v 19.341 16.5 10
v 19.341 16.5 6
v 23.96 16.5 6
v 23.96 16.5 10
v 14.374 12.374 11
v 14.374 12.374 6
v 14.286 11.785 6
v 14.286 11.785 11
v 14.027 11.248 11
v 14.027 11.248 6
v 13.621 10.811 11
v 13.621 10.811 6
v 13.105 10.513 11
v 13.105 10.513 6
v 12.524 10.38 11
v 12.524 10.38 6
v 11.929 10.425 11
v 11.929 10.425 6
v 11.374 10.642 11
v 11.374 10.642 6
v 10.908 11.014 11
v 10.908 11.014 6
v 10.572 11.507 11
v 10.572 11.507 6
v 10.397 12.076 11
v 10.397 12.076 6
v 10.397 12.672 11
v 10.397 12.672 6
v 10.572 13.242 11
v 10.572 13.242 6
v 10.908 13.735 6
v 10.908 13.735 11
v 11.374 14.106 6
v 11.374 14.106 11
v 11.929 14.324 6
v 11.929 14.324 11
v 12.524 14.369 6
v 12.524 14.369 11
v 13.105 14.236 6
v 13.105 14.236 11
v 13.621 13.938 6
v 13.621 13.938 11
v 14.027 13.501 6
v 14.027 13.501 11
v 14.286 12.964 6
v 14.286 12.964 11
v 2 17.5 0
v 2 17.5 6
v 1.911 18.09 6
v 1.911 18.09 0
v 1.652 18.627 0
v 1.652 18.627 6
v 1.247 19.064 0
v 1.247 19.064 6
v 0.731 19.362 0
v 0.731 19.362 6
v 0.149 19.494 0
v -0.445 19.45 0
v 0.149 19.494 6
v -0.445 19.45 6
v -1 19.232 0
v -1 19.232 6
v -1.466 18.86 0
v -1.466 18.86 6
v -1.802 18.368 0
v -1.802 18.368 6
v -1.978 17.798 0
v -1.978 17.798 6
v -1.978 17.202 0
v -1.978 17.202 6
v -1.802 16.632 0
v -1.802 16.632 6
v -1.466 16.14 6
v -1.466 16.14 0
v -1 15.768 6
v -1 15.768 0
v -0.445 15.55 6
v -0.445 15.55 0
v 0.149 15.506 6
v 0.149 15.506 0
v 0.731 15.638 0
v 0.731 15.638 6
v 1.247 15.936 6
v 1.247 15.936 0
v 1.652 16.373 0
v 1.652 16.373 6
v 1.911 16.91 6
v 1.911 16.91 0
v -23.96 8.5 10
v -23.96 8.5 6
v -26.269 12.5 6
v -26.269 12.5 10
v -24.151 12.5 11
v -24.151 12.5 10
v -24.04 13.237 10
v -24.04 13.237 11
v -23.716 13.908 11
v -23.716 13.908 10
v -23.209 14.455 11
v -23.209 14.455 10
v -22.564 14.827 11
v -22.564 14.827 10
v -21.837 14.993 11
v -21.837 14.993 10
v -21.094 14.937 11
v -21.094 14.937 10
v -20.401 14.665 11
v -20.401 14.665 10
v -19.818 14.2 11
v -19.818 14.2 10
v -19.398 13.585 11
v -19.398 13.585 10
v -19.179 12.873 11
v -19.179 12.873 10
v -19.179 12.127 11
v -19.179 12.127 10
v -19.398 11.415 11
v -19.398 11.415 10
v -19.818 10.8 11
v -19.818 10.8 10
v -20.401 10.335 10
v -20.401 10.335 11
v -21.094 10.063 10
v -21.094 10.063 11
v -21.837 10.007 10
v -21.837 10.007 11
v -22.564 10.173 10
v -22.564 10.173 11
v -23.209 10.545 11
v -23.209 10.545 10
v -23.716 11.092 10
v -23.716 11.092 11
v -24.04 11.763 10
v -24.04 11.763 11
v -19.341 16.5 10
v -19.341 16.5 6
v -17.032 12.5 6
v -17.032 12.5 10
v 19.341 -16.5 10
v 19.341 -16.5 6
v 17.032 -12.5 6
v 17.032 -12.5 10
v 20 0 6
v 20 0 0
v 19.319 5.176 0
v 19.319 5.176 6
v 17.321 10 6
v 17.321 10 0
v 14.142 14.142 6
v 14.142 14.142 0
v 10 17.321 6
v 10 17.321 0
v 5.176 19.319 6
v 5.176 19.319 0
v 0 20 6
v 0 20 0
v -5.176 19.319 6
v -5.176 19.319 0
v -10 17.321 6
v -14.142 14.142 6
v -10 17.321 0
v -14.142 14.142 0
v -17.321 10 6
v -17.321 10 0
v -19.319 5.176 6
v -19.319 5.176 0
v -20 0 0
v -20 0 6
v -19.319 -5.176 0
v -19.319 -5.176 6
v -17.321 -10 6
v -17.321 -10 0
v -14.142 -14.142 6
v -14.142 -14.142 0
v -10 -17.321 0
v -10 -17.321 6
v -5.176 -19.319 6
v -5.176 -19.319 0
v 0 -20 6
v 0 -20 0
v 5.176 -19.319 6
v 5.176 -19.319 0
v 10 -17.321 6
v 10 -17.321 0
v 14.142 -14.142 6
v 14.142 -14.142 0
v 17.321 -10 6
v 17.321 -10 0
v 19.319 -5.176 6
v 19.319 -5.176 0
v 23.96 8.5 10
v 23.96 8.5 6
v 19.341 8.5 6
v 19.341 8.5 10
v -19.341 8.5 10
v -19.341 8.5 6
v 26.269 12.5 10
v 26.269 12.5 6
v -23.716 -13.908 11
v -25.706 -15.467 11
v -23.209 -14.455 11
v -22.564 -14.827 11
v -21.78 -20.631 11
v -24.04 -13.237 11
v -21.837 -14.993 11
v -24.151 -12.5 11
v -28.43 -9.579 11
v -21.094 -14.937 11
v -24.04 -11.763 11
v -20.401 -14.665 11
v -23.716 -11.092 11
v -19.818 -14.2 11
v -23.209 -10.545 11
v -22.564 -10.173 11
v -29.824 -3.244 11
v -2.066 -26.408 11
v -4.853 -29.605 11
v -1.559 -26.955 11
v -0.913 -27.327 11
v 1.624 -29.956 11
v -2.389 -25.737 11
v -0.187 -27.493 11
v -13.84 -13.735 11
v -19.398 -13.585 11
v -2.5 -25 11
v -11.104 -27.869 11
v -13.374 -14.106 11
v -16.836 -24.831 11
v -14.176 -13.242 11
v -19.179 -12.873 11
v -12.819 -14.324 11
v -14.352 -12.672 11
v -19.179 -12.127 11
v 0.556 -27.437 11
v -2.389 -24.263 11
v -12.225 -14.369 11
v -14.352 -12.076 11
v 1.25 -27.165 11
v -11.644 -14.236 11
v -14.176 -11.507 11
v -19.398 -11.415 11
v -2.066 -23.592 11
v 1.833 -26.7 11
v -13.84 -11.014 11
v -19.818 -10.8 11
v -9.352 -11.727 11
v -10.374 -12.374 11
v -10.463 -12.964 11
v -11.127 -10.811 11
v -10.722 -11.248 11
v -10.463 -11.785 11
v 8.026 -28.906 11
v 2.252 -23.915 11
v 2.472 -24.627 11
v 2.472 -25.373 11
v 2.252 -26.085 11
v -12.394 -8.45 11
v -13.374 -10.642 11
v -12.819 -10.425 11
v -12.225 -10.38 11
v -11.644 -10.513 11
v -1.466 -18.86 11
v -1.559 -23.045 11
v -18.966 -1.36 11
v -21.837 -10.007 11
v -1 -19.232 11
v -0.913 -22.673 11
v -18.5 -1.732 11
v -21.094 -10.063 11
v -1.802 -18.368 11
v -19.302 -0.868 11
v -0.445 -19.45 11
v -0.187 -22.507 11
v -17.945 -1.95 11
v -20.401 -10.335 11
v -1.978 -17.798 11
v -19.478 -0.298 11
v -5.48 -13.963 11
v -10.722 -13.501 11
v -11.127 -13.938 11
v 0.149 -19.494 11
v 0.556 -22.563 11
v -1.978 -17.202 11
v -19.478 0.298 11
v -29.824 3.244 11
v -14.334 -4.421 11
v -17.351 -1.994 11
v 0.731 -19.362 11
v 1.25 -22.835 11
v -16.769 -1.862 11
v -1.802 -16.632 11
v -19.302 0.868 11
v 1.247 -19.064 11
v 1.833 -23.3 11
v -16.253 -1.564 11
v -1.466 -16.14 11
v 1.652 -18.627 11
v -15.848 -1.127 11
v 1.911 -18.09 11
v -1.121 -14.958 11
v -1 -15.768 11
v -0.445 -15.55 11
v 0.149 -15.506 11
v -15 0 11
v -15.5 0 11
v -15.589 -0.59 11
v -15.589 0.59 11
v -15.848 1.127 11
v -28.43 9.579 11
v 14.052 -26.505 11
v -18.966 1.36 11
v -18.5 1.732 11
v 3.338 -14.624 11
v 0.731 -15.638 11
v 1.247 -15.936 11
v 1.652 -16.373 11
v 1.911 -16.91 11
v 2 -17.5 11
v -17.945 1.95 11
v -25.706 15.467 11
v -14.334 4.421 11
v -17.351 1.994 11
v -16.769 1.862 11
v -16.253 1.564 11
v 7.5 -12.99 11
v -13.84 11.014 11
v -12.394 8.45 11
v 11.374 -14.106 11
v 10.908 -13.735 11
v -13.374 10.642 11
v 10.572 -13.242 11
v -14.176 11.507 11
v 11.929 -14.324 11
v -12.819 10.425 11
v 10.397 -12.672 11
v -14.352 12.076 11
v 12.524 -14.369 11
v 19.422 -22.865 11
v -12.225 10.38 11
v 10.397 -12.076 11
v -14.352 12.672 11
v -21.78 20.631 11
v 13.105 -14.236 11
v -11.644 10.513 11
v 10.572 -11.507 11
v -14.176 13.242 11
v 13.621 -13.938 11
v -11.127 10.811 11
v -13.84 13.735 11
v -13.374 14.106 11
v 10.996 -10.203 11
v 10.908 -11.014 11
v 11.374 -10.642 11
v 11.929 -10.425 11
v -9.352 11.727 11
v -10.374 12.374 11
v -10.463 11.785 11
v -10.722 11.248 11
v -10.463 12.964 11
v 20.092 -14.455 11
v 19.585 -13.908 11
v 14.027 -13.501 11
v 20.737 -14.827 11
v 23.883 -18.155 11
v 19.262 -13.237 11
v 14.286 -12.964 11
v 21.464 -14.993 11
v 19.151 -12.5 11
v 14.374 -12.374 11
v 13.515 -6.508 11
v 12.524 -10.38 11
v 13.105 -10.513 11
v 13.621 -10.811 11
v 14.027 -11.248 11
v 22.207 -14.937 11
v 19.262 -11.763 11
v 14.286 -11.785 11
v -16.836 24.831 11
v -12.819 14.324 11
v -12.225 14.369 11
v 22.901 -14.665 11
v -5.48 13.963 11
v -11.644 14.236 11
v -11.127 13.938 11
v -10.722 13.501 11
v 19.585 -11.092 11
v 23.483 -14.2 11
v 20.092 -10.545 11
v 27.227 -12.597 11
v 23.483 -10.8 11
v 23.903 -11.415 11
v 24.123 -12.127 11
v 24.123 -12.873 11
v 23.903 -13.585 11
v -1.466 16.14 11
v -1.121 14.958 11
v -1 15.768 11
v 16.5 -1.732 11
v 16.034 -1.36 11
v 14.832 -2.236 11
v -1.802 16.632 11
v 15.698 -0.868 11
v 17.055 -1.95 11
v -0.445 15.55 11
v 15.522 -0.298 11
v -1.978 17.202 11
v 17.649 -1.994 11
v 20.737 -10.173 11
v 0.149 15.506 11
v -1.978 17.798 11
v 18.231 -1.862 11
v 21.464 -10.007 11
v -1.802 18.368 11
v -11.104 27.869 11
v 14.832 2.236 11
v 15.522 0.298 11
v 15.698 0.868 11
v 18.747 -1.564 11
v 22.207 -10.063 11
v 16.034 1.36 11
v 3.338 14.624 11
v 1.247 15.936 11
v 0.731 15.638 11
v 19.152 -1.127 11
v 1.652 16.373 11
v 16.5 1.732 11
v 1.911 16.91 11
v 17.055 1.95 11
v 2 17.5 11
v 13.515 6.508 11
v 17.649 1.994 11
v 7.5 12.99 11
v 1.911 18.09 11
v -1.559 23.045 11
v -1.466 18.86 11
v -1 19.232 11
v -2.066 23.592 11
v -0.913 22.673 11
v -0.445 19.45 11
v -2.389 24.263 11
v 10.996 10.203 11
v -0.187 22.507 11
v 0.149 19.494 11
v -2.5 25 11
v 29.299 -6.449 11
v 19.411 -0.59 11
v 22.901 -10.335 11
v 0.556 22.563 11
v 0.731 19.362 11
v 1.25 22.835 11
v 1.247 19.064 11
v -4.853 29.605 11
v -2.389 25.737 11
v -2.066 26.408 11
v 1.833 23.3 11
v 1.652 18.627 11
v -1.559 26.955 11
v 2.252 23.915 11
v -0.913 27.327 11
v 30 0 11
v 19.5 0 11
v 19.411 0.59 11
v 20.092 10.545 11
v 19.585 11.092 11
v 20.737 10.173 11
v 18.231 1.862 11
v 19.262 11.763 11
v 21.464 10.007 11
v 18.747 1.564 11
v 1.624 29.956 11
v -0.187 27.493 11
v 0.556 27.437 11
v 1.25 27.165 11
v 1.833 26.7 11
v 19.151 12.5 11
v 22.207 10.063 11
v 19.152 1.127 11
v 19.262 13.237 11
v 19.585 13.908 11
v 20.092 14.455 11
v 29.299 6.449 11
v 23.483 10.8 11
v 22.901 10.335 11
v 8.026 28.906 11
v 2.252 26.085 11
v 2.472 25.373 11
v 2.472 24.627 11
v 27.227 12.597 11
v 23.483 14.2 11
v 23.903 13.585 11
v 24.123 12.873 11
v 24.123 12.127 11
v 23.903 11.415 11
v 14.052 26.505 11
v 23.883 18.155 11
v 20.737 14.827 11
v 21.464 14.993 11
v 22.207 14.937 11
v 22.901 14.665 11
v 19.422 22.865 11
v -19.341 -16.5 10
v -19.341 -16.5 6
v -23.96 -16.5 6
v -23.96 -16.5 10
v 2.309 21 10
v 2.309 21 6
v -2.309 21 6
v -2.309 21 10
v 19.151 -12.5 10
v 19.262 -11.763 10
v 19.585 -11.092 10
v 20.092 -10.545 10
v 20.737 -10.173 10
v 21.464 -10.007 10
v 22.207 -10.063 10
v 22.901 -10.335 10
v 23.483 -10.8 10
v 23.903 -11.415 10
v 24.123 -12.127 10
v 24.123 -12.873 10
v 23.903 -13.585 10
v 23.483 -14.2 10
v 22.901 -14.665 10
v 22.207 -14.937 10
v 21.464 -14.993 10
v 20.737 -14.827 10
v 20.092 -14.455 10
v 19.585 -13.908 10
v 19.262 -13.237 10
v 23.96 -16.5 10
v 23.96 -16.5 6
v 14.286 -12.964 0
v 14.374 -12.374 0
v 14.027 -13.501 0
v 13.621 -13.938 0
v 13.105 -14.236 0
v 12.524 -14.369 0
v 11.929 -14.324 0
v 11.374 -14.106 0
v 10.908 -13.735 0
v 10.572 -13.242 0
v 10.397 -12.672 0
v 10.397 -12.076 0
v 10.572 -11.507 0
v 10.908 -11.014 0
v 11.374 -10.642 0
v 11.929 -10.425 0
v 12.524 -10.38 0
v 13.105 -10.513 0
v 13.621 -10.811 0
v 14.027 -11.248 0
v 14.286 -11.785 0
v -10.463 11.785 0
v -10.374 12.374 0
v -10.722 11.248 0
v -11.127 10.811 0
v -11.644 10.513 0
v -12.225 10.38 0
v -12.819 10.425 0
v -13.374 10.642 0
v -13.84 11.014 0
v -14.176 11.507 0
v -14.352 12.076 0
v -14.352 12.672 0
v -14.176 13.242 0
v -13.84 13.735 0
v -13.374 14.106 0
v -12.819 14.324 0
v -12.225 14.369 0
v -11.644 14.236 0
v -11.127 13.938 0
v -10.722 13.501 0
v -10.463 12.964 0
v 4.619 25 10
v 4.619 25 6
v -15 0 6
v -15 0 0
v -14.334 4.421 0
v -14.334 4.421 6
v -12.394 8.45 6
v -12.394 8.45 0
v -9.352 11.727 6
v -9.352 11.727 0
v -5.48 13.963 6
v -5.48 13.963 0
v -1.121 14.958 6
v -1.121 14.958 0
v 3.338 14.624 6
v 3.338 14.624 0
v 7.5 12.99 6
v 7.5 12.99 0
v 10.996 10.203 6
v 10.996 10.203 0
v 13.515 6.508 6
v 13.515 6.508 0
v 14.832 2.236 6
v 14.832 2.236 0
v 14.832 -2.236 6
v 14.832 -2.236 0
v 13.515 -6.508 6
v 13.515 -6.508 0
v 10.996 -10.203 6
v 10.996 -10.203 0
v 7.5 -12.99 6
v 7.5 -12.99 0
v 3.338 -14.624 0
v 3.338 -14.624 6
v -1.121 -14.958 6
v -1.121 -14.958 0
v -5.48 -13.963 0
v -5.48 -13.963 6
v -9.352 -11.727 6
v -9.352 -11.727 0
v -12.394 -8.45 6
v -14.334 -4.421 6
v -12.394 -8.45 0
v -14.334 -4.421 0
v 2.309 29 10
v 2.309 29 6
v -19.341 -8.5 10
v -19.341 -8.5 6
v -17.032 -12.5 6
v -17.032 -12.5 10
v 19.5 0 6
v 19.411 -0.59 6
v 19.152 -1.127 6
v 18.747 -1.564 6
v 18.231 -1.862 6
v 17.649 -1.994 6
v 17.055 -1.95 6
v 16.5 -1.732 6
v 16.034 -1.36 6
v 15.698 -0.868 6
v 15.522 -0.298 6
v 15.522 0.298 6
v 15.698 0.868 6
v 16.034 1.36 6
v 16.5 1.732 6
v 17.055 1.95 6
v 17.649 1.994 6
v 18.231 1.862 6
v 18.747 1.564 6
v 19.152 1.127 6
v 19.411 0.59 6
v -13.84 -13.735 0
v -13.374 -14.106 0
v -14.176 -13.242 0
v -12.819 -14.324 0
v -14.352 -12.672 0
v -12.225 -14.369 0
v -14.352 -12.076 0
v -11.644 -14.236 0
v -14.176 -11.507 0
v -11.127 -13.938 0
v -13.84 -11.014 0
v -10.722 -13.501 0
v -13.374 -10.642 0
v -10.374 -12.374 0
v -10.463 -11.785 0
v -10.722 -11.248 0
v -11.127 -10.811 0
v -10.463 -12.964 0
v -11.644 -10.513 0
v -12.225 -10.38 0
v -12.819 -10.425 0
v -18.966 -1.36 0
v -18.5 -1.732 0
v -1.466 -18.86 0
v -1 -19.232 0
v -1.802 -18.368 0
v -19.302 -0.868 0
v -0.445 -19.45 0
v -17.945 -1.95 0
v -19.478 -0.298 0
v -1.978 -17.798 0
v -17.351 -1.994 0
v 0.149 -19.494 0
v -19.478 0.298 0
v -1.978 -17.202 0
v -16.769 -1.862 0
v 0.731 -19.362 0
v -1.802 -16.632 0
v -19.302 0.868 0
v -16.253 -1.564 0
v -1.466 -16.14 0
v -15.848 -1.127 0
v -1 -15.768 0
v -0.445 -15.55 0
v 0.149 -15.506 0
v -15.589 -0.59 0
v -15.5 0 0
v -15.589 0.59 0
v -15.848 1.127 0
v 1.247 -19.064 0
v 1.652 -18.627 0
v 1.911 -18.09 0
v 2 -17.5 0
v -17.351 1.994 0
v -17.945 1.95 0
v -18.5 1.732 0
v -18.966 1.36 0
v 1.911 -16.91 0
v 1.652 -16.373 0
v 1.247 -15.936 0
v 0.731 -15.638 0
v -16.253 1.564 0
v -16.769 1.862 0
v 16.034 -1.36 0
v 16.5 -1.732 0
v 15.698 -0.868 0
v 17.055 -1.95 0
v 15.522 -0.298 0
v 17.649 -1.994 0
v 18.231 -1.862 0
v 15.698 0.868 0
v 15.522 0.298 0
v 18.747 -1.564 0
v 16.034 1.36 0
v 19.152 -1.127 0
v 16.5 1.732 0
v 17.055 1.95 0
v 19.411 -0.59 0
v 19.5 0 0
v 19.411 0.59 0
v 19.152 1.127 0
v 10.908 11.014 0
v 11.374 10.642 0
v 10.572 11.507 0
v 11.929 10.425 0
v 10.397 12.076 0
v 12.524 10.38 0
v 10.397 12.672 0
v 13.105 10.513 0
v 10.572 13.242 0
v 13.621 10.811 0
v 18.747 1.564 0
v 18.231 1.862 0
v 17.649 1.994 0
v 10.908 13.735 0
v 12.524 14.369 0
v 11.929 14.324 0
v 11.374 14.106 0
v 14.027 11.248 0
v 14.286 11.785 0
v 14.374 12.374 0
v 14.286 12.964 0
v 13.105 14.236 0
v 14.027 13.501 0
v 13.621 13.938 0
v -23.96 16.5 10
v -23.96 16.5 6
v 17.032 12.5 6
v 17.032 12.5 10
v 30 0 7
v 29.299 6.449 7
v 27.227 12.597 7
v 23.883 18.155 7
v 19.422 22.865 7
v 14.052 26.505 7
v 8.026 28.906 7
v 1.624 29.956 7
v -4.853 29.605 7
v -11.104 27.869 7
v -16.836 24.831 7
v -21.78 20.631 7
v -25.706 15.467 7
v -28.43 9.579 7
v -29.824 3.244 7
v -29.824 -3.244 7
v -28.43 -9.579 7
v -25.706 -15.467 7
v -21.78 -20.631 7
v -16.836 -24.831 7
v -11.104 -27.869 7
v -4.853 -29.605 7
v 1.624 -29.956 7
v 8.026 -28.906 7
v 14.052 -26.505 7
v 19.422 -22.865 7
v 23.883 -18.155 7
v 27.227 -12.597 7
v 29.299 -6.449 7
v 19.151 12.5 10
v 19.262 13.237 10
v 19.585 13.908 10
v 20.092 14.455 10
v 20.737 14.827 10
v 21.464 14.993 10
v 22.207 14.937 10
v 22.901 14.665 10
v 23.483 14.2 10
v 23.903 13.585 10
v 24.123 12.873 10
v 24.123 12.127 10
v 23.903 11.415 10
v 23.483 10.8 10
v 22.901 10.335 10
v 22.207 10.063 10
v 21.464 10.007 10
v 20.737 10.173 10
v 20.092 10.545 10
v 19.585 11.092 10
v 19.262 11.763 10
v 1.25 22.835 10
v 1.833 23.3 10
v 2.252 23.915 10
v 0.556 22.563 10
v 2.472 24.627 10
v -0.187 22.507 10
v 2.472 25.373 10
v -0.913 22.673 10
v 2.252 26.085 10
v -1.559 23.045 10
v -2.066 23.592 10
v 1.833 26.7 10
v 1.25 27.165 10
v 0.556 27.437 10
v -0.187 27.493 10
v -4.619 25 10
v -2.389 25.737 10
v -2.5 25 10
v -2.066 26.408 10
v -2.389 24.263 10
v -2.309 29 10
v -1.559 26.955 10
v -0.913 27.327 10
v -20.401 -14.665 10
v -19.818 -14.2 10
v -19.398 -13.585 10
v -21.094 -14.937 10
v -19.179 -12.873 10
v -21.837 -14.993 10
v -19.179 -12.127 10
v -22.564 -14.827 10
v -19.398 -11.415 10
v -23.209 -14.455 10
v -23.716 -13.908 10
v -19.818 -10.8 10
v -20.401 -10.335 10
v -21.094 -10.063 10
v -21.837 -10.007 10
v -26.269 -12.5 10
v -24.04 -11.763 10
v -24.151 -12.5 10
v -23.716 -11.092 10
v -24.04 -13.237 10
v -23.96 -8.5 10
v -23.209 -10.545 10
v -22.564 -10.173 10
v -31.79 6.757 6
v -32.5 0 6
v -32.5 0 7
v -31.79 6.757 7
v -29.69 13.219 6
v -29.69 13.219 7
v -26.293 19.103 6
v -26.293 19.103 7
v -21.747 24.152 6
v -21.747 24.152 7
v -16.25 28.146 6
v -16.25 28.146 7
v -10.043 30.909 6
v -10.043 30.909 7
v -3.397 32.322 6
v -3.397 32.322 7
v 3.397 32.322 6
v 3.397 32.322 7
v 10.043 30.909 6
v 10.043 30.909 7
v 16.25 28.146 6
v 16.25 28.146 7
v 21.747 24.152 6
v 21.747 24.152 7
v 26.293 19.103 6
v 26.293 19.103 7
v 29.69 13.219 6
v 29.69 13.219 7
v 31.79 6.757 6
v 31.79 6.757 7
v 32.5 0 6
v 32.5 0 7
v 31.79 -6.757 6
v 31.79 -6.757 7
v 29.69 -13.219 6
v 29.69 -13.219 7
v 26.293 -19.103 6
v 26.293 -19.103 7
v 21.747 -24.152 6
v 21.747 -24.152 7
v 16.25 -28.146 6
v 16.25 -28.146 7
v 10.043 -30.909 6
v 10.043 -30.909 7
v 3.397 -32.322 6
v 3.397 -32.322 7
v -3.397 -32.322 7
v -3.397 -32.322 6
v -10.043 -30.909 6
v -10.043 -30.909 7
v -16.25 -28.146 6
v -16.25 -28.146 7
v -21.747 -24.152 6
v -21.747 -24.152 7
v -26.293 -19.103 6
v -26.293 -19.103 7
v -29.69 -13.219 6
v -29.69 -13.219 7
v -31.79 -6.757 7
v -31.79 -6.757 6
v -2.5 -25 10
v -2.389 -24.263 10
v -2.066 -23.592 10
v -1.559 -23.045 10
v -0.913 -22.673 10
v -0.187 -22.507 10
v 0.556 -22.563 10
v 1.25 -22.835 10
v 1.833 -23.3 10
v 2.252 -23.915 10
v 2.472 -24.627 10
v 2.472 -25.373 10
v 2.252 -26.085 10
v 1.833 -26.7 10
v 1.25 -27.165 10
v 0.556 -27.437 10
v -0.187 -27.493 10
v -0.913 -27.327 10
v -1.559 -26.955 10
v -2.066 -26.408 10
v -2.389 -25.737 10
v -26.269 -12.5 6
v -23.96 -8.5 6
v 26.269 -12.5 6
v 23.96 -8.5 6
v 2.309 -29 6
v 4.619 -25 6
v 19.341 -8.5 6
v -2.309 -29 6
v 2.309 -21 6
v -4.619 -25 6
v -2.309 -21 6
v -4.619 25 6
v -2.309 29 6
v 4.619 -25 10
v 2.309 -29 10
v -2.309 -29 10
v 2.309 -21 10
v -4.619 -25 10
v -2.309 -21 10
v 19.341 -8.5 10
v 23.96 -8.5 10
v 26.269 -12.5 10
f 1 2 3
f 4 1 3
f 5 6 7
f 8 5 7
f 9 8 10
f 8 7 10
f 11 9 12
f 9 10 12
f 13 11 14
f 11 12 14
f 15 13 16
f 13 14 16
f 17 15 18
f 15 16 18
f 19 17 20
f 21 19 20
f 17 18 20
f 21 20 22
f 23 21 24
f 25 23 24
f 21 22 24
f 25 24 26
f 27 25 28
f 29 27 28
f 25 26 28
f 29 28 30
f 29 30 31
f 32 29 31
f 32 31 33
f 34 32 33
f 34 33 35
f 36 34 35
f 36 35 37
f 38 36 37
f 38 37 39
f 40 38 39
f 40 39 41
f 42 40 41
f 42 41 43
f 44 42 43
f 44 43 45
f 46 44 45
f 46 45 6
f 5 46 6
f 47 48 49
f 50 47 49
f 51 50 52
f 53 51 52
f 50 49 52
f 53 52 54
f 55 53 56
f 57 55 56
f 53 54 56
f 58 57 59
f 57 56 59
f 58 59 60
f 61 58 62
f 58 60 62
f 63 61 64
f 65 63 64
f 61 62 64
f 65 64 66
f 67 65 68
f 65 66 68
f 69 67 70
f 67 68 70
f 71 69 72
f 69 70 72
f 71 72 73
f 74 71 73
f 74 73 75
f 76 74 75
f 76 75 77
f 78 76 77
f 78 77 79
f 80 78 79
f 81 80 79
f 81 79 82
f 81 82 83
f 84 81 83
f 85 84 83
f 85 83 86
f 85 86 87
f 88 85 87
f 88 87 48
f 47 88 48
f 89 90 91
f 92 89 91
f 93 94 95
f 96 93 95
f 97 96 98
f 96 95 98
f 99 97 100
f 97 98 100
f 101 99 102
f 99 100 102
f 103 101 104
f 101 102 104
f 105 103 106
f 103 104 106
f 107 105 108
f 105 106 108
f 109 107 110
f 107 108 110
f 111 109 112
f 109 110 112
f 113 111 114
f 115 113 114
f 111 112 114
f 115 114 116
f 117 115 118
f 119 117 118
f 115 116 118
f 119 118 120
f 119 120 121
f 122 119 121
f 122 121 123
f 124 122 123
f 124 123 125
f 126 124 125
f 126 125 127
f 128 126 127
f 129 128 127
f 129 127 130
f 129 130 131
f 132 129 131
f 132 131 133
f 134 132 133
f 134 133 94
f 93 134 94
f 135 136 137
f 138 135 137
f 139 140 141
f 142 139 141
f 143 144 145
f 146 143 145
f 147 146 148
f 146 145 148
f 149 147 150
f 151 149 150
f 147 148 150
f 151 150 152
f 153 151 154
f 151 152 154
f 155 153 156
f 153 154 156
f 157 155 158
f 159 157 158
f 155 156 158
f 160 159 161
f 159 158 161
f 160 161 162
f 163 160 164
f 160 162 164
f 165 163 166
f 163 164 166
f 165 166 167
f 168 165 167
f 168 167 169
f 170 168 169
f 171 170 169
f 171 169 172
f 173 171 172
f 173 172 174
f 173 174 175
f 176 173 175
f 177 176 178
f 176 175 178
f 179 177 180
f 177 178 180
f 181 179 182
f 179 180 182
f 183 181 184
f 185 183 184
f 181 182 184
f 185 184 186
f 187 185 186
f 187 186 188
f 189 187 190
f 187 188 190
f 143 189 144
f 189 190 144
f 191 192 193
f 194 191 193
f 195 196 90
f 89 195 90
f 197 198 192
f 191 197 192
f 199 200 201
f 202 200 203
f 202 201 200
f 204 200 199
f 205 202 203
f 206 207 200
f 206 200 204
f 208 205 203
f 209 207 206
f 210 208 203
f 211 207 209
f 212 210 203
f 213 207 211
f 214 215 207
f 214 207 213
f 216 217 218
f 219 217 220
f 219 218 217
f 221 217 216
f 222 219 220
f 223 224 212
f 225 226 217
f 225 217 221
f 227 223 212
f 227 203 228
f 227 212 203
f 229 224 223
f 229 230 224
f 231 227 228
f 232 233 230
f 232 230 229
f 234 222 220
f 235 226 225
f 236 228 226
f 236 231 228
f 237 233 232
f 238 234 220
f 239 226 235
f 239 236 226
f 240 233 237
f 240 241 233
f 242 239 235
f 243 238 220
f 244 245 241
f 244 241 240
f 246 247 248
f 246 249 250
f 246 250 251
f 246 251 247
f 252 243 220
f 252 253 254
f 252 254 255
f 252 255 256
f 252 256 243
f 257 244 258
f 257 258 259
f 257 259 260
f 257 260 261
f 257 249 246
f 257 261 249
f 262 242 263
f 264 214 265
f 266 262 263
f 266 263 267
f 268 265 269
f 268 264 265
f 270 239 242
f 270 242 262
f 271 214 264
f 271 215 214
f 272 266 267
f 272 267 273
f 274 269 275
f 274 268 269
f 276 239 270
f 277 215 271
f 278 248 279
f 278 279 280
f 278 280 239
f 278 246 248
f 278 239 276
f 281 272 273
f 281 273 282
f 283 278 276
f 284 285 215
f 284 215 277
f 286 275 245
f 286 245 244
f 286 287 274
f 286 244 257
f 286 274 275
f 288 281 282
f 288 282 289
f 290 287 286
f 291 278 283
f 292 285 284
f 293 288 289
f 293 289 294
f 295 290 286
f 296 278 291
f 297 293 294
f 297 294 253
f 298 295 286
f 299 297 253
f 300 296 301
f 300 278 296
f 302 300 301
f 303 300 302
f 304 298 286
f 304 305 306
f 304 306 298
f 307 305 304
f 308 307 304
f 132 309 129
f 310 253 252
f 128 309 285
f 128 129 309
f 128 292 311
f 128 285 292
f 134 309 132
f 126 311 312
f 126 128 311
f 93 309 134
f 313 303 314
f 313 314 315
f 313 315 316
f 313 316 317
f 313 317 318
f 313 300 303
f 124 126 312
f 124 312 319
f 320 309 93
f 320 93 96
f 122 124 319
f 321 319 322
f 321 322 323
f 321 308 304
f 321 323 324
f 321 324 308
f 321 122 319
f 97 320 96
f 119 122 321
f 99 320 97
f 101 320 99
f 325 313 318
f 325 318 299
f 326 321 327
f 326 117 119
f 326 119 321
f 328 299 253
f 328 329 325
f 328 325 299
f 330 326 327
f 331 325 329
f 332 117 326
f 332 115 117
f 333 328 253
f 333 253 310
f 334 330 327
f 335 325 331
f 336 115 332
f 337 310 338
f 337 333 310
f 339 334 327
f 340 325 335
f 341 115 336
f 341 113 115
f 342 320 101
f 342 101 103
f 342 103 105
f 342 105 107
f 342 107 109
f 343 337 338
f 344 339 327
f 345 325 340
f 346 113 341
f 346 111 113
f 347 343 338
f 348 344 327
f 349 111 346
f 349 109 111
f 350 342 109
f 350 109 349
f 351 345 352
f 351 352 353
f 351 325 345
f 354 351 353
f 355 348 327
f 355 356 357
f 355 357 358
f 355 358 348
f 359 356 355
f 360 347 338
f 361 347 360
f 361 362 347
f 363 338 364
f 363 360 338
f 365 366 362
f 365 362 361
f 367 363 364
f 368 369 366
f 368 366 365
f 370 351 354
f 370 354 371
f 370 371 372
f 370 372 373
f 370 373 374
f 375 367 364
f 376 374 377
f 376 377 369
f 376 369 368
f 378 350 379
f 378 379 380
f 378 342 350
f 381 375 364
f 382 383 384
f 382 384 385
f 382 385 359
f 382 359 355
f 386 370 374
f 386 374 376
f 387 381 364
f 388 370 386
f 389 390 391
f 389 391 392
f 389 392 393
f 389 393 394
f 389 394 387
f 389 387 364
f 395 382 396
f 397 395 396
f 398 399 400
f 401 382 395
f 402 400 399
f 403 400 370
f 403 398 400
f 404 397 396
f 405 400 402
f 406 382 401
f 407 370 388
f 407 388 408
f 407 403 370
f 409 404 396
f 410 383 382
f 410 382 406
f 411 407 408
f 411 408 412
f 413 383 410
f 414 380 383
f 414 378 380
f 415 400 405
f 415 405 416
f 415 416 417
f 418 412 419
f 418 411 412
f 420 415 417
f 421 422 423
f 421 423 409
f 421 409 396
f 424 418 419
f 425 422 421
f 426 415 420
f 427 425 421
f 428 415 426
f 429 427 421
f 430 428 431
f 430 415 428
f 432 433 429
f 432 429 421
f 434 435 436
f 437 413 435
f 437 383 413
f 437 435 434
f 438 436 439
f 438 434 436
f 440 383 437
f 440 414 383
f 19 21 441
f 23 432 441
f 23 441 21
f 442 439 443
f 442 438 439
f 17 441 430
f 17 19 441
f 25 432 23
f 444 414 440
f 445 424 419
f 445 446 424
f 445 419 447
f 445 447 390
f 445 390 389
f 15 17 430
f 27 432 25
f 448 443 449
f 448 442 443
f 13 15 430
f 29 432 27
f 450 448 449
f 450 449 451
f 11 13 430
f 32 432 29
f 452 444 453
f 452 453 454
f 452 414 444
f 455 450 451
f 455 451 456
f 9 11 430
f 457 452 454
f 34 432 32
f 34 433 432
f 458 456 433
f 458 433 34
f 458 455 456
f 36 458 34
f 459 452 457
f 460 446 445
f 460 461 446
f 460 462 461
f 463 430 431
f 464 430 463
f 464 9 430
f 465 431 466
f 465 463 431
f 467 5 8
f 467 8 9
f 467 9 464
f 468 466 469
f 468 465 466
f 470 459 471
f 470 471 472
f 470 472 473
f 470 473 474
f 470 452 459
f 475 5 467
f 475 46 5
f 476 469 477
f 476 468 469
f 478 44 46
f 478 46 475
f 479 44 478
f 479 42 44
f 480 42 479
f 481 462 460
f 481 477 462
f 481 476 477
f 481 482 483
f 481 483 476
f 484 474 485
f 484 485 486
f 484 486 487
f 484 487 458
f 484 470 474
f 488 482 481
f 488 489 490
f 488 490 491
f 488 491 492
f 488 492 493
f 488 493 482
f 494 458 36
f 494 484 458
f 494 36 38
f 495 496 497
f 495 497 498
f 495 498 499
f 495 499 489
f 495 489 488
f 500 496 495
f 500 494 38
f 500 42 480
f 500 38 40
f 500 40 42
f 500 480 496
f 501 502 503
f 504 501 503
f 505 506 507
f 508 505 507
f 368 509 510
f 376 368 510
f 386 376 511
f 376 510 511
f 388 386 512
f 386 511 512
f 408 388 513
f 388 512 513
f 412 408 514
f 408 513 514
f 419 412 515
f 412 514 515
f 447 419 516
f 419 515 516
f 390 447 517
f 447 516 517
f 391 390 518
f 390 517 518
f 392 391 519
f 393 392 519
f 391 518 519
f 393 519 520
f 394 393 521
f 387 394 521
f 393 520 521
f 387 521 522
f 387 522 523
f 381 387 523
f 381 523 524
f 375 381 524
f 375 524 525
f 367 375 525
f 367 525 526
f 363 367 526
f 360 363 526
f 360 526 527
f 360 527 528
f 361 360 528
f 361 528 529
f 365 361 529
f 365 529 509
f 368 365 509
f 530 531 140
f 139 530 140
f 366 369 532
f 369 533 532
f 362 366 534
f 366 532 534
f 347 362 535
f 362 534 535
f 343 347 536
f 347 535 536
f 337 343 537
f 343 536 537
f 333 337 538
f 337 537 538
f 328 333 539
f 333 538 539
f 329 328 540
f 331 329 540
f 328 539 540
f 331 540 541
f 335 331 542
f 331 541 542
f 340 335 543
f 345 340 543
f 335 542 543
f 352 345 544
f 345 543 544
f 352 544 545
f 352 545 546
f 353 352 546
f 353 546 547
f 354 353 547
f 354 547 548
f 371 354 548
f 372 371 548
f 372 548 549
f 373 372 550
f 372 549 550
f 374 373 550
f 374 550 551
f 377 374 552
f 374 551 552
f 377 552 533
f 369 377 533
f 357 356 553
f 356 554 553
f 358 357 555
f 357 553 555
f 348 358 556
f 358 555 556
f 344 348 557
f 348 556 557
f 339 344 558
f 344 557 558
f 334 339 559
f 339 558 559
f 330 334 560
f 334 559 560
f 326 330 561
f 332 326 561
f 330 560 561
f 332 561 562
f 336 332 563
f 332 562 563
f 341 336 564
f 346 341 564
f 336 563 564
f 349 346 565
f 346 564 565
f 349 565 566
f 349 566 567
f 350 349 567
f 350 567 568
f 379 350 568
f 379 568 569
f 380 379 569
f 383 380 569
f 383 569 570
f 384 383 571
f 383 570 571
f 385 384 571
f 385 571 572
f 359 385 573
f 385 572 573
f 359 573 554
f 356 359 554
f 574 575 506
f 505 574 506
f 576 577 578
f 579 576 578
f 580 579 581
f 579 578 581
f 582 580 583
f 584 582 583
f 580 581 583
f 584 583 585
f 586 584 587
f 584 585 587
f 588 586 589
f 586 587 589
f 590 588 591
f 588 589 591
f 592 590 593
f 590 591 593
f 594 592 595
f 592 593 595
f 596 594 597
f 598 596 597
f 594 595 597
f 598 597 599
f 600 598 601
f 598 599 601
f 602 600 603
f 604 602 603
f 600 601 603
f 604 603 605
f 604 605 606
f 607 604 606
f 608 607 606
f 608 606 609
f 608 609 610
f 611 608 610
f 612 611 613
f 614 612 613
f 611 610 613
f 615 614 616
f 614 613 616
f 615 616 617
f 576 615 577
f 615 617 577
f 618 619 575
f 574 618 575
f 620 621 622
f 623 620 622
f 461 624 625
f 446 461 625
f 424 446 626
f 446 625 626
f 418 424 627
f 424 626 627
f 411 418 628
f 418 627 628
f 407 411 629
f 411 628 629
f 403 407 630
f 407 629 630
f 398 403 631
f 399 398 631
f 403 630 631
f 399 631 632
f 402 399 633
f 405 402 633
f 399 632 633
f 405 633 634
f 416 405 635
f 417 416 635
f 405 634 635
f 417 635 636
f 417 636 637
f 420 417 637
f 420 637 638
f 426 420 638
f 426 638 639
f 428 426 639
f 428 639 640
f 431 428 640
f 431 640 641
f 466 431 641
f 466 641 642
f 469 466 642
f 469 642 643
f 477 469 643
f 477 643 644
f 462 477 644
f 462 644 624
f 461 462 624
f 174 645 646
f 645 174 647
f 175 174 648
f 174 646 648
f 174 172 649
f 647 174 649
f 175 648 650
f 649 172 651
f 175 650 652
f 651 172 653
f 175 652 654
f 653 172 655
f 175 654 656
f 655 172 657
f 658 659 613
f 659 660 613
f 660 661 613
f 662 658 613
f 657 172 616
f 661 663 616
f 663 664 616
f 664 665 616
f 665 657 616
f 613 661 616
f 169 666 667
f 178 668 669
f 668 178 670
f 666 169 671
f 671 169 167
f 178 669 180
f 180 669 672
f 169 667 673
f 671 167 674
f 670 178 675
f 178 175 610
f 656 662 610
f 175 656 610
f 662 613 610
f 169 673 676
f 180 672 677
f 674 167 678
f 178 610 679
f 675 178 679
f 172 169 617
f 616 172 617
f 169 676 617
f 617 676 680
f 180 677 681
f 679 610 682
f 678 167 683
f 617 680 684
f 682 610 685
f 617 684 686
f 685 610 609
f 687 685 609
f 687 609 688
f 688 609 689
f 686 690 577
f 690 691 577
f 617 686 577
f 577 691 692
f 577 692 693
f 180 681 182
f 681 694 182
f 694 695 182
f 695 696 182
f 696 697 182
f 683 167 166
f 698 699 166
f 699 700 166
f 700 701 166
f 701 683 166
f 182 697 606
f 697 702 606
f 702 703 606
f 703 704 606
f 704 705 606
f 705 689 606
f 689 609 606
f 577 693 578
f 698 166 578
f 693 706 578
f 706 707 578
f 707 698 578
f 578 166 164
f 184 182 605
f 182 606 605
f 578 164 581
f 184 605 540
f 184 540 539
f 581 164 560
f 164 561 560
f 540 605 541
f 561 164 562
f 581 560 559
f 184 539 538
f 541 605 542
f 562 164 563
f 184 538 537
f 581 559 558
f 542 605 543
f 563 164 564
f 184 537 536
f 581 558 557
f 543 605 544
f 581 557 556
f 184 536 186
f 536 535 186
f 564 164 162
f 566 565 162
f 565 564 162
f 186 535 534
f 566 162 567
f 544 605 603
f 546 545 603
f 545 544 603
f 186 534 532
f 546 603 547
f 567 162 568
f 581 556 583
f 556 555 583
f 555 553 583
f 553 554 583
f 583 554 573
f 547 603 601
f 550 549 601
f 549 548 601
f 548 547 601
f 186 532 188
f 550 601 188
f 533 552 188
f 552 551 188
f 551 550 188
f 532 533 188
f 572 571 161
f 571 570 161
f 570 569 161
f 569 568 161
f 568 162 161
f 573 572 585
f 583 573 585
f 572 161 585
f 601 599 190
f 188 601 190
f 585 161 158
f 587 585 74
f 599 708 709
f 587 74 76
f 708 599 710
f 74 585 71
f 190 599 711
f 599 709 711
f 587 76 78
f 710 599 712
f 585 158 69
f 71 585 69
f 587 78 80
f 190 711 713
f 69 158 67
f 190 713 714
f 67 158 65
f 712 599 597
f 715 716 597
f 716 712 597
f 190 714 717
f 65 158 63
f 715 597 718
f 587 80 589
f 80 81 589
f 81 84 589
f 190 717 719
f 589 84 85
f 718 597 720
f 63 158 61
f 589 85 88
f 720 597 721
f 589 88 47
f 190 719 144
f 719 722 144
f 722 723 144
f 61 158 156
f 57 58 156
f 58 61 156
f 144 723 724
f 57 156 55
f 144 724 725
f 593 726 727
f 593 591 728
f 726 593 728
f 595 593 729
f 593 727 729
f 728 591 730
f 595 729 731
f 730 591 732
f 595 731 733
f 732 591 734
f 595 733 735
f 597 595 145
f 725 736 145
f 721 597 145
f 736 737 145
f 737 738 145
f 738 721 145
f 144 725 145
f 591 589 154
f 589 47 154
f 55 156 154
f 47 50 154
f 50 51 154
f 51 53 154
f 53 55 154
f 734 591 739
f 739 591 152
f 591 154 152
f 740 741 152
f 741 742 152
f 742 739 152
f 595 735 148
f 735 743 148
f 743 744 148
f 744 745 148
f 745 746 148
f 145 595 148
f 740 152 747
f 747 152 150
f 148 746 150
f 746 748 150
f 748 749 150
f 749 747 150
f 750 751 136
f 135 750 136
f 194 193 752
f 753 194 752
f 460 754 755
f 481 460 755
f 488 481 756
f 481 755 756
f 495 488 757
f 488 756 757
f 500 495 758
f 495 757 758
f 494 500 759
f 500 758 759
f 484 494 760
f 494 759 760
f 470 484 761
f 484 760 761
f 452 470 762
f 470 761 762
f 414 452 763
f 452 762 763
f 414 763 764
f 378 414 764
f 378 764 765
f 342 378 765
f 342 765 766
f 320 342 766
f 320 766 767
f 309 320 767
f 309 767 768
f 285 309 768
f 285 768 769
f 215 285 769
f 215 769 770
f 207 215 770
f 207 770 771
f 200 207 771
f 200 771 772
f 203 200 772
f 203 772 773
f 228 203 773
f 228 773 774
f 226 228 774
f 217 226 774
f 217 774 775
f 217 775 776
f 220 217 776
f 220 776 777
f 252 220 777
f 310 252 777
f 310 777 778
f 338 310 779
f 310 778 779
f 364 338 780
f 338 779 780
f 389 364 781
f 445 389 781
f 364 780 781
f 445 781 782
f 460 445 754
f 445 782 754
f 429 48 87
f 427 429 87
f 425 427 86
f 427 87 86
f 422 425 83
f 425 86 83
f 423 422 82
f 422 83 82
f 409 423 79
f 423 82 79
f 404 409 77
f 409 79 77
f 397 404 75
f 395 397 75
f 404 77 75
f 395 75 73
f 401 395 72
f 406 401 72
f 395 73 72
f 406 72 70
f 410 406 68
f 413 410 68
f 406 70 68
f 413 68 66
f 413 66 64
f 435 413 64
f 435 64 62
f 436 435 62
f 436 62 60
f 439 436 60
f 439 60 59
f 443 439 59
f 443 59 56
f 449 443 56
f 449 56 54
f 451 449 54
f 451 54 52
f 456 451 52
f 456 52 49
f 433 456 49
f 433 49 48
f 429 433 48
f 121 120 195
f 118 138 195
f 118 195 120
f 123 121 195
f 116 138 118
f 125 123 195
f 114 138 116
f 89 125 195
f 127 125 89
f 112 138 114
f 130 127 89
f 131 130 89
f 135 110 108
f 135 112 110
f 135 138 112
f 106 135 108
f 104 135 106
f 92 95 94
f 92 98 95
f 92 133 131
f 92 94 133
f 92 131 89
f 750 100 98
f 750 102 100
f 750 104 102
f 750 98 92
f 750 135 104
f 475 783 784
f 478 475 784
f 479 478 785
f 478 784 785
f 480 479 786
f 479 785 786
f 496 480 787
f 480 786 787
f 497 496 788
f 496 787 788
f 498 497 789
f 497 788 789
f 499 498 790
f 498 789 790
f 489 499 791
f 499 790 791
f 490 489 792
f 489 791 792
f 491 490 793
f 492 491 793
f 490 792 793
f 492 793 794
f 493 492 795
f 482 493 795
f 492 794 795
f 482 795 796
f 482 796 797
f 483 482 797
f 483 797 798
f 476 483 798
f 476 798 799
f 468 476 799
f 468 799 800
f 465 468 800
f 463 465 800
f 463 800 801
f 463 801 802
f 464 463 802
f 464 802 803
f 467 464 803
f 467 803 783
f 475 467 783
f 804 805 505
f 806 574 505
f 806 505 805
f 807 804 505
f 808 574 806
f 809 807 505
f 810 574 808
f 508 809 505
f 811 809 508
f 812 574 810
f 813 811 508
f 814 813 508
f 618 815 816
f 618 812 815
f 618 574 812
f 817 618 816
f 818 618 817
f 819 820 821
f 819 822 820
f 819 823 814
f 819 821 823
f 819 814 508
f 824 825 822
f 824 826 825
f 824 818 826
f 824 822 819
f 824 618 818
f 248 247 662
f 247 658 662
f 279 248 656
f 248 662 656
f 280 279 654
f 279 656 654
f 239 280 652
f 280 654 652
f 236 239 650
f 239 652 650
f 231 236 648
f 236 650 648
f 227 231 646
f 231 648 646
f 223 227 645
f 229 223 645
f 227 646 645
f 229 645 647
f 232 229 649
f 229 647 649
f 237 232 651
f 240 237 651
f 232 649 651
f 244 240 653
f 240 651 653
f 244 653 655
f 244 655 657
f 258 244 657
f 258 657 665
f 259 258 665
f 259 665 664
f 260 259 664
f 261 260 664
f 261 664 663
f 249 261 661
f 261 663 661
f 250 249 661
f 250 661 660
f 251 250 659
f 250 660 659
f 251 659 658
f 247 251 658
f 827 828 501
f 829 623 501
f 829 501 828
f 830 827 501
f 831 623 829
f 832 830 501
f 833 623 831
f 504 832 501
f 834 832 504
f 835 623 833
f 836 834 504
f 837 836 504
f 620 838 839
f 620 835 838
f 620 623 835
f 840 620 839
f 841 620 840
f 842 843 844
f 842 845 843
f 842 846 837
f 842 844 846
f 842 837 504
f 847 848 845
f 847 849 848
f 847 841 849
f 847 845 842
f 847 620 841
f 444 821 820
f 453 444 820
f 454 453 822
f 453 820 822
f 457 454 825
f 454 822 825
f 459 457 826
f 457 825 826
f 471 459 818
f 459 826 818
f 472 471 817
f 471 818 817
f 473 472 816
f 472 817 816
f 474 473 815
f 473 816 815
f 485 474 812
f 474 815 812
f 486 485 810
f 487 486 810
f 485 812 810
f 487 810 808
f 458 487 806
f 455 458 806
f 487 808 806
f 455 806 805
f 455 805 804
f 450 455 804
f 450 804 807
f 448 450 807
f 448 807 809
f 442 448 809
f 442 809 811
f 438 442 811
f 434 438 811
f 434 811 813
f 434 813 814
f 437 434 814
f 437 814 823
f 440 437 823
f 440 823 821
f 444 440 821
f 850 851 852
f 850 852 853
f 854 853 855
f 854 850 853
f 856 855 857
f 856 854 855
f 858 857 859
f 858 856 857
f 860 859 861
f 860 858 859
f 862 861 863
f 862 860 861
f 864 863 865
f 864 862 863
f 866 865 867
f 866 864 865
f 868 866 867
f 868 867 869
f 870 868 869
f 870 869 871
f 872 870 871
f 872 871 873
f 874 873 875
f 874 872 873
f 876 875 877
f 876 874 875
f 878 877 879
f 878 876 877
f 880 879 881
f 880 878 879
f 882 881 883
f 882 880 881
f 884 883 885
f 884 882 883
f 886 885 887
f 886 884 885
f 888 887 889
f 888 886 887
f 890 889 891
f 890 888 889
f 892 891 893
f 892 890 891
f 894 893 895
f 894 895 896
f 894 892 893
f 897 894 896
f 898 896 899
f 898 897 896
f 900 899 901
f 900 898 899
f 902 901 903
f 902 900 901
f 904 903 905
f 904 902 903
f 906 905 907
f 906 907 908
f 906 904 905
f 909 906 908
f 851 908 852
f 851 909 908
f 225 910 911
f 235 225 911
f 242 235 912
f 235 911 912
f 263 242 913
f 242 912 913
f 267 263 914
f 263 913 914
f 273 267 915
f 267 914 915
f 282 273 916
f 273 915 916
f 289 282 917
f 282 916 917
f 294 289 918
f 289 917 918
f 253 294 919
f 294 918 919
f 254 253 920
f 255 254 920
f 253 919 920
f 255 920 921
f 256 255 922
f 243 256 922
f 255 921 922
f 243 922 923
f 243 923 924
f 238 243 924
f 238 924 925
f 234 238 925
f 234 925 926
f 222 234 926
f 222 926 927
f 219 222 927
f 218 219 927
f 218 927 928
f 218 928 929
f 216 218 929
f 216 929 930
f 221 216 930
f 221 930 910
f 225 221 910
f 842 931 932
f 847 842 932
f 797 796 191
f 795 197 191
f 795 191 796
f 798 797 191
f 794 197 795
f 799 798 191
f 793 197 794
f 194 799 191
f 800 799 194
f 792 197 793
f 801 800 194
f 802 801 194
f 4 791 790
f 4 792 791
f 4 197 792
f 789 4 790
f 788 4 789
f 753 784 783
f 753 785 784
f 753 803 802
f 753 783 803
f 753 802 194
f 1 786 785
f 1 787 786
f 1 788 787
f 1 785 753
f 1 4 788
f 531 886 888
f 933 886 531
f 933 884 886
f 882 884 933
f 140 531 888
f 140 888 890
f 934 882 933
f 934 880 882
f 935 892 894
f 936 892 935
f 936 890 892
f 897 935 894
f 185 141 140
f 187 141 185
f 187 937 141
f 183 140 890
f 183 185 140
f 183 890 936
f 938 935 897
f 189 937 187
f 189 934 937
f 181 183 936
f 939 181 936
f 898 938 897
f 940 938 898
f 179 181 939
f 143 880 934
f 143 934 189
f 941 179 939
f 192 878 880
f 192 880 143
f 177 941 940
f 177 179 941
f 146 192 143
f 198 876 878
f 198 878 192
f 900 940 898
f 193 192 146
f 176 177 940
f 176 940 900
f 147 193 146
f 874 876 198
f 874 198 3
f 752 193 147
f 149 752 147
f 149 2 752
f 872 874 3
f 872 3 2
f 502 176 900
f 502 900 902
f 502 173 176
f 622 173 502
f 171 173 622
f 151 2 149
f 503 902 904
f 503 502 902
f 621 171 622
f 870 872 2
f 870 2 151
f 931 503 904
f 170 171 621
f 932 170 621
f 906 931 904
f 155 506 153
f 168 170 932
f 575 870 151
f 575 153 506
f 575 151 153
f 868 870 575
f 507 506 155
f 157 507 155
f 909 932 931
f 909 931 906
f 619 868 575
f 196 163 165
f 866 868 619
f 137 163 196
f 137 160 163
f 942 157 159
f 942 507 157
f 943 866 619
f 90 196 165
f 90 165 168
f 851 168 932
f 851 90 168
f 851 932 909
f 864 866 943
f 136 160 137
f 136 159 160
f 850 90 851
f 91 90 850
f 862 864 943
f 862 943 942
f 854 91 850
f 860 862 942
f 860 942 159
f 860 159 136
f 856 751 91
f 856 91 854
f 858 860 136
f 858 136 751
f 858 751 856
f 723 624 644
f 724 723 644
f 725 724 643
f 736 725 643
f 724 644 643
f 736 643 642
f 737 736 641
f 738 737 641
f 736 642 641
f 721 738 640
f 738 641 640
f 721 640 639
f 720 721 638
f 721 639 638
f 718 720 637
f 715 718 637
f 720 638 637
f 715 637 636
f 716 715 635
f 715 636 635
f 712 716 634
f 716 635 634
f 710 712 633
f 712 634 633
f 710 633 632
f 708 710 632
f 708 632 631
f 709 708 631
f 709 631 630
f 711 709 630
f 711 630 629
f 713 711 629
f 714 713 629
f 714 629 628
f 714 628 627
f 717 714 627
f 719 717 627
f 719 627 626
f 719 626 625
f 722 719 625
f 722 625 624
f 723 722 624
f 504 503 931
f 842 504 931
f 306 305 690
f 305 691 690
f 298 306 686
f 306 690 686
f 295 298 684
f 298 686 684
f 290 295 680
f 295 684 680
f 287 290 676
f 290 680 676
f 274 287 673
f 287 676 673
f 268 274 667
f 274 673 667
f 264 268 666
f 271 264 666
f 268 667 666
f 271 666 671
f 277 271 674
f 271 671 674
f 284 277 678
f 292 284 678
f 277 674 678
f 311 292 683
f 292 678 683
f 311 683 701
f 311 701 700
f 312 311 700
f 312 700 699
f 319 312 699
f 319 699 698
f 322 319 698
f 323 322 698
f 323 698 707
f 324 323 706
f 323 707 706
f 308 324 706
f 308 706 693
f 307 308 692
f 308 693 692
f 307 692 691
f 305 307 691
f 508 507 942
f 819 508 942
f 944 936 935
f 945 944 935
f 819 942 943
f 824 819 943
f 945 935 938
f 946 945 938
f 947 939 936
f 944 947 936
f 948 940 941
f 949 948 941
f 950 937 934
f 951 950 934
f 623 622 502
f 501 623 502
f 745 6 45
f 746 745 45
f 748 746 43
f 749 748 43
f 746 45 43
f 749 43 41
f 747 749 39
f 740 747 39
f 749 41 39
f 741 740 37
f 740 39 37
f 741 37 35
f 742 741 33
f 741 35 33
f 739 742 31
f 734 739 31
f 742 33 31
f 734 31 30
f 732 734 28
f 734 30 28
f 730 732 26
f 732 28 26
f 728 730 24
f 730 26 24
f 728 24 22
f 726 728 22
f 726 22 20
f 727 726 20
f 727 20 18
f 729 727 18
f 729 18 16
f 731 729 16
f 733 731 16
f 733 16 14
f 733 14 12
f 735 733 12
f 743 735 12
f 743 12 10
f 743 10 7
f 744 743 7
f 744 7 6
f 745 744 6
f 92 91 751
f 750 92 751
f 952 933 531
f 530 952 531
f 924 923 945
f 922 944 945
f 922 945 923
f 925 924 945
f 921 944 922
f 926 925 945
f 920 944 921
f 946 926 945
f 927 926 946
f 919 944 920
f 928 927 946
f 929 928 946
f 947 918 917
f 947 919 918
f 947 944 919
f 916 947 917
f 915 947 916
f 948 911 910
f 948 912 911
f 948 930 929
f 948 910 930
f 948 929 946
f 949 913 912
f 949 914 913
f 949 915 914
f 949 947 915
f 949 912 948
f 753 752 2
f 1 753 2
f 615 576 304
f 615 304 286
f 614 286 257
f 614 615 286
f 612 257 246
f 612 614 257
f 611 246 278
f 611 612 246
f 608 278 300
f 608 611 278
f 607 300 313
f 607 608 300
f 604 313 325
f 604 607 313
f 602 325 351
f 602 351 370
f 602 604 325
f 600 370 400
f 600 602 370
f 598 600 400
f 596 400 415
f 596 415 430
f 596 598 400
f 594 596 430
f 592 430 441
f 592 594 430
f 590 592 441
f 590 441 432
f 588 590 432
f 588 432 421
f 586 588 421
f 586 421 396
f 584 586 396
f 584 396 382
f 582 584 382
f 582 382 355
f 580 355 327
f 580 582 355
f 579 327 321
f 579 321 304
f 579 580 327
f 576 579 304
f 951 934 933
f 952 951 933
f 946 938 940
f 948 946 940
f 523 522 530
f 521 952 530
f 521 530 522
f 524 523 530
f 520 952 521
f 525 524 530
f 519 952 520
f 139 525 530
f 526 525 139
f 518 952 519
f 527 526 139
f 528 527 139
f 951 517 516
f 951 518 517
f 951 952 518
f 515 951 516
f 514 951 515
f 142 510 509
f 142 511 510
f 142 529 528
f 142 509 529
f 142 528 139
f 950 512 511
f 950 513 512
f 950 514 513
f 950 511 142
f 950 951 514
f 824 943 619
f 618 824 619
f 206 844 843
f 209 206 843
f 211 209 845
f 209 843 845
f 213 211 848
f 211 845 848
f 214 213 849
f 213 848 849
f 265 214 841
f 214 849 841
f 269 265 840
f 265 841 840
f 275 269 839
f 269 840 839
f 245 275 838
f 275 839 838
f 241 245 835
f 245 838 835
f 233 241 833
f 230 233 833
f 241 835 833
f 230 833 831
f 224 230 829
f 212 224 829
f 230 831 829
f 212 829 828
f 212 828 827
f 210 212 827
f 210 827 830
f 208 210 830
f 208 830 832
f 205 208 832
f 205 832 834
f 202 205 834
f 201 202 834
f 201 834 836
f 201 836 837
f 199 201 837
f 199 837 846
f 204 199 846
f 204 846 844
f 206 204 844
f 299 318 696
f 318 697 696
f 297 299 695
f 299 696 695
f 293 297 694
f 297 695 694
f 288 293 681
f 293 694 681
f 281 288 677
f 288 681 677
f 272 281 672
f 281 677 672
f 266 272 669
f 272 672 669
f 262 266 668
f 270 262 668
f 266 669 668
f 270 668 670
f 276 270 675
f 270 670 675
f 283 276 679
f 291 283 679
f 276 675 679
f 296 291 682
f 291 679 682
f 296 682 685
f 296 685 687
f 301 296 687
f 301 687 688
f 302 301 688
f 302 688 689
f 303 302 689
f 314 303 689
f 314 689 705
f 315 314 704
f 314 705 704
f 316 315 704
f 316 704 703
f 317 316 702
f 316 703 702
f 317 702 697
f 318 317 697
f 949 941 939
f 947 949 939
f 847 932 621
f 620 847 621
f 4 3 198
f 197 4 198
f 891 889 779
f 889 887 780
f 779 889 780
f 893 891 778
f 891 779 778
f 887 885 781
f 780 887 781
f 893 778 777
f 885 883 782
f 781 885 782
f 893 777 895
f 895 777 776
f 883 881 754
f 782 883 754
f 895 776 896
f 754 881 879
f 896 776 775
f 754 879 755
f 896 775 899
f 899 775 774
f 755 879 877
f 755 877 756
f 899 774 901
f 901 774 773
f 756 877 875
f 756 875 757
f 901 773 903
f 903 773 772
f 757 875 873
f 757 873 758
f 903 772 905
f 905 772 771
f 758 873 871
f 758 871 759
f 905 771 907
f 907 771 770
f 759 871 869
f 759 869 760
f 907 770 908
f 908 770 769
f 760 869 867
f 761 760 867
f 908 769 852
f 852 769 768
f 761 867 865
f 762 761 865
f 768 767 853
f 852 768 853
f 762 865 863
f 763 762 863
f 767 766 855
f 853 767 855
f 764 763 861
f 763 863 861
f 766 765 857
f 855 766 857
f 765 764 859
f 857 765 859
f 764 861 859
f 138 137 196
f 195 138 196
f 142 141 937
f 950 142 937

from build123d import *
from build123d.topology import SkipClean

# Parameters (mm, degrees)
SKETCH1_R               = 20
BOSS_EXTRUDE1_DEPTH     = 6
CUT_EXTRUDE1_DEPTH      = 7
CUT_EXTRUDE1_DEPTH_BACK = 29.91366459
SKETCH2_R               = 2
SKETCH3_R               = 15
CUT_EXTRUDE2_DEPTH      = 6
SKETCH4_R               = 30
SKETCH4_R_2             = 15
BOSS_EXTRUDE2_DEPTH     = 5
CUT_EXTRUDE3_START      = -7
SKETCH6_R               = 2
CUT_EXTRUDE3_DEPTH      = 7
CUT_EXTRUDE4_DEPTH      = 4
SKETCH8_R               = 2.5
CUT_EXTRUDE5_DEPTH      = 4
SKETCH9_R               = 32.5
SKETCH9_R_2             = 30
BOSS_EXTRUDE3_DEPTH     = 1


with BuildPart() as part:
    # Sketch1 → Boss-Extrude1 (new body)
    with BuildSketch(Plane.XY):
        Circle(SKETCH1_R)
    extrude(amount=BOSS_EXTRUDE1_DEPTH)

    # Sketch2 → Cut-Extrude1 (cut, two sides: drawn at the far end of the back side and taken through both)
    with BuildSketch(Plane.XY.offset(6).offset(-CUT_EXTRUDE1_DEPTH_BACK)):
        with Locations((0, 17.5)):
            Circle(SKETCH2_R)
        with Locations((12.374368671, 12.374368671)):
            Circle(SKETCH2_R)
        with Locations((17.5, 0)):
            Circle(SKETCH2_R)
        with Locations((12.374368671, -12.374368671)):
            Circle(SKETCH2_R)
        with Locations((0, -17.5)):
            Circle(SKETCH2_R)
        with Locations((-12.374368671, -12.374368671)):
            Circle(SKETCH2_R)
        with Locations((-17.5, 0)):
            Circle(SKETCH2_R)
        with Locations((-12.374368671, 12.374368671)):
            Circle(SKETCH2_R)
    extrude(amount=CUT_EXTRUDE1_DEPTH + CUT_EXTRUDE1_DEPTH_BACK, mode=Mode.SUBTRACT)

    # Sketch3 → Cut-Extrude2 (cut)
    with BuildSketch(Plane(origin=(0, 0, 0), x_dir=(-1, 0, 0), z_dir=(0, 0, -1))):
        Circle(SKETCH3_R)
    extrude(amount=-CUT_EXTRUDE2_DEPTH, mode=Mode.SUBTRACT)

    # Sketch4 → Boss-Extrude2 (add)
    with SkipClean():  # the faces are left unmerged after this step: merging them gives an invalid solid
        with BuildSketch(Plane.XY.offset(6)):
            Circle(SKETCH4_R)
            Circle(SKETCH4_R_2, mode=Mode.SUBTRACT)
        extrude(amount=BOSS_EXTRUDE2_DEPTH)
    add(part.part.scale(1), mode=Mode.REPLACE)  # the faces are merged on a copy

    # Sketch6 → Cut-Extrude3 (cut)
    with SkipClean():  # the faces are left unmerged after this step: merging them gives an invalid solid
        with BuildSketch(Plane(origin=(0, 0, 6), x_dir=(-1, 0, 0), z_dir=(0, 0, -1)).offset(CUT_EXTRUDE3_START)):
            with Locations((0, 17.5)):
                Circle(SKETCH6_R)
            with Locations((12.374368671, 12.374368671)):
                Circle(SKETCH6_R)
            with Locations((17.5, 0)):
                Circle(SKETCH6_R)
            with Locations((12.374368671, -12.374368671)):
                Circle(SKETCH6_R)
            with Locations((0, -17.5)):
                Circle(SKETCH6_R)
            with Locations((-12.374368671, -12.374368671)):
                Circle(SKETCH6_R)
            with Locations((-17.5, 0)):
                Circle(SKETCH6_R)
            with Locations((-12.374368671, 12.374368671)):
                Circle(SKETCH6_R)
        extrude(amount=CUT_EXTRUDE3_DEPTH, mode=Mode.SUBTRACT)

    # Sketch7 → Cut-Extrude4 (cut)
    with SkipClean():  # the faces are left unmerged after this step: merging them gives an invalid solid
        with BuildSketch(Plane(origin=(0, 0, 6), x_dir=(-1, 0, 0), z_dir=(0, 0, -1))):
            Polygon((23.960036171, 8.5), (26.269437248, 12.5), (23.960036171, 16.5), (19.341234018, 16.5), (17.031832941, 12.5), (19.341234018, 8.5), align=None)
            Polygon((4.618802154, 25), (2.309401077, 29), (-2.309401077, 29), (-4.618802154, 25), (-2.309401077, 21), (2.309401077, 21), align=None)
            Polygon((19.341234018, -16.5), (23.960036171, -16.5), (26.269437248, -12.5), (23.960036171, -8.5), (19.341234018, -8.5), (17.031832941, -12.5), align=None)
            Polygon((-4.618802154, -25), (-2.309401077, -29), (2.309401077, -29), (4.618802154, -25), (2.309401077, -21), (-2.309401077, -21), align=None)
            Polygon((-23.960036171, -8.5), (-26.269437248, -12.5), (-23.960036171, -16.5), (-19.341234018, -16.5), (-17.031832941, -12.5), (-19.341234018, -8.5), align=None)
            Polygon((-19.341234018, 16.5), (-23.960036171, 16.5), (-26.269437248, 12.5), (-23.960036171, 8.5), (-19.341234018, 8.5), (-17.031832941, 12.5), align=None)
        extrude(amount=-CUT_EXTRUDE4_DEPTH, mode=Mode.SUBTRACT)

    # Sketch8 → Cut-Extrude5 (cut)
    with SkipClean():  # the faces are left unmerged after this step: merging them gives an invalid solid
        with BuildSketch(Plane(origin=(0, 0, 10), x_dir=(-1, 0, 0), z_dir=(0, 0, -1))):
            with Locations((0, 25)):
                Circle(SKETCH8_R)
            with Locations((21.650635095, 12.5)):
                Circle(SKETCH8_R)
            with Locations((21.650635095, -12.5)):
                Circle(SKETCH8_R)
            with Locations((0, -25)):
                Circle(SKETCH8_R)
            with Locations((-21.650635095, -12.5)):
                Circle(SKETCH8_R)
            with Locations((-21.650635095, 12.5)):
                Circle(SKETCH8_R)
        extrude(amount=-CUT_EXTRUDE5_DEPTH, mode=Mode.SUBTRACT)

    # Sketch9 → Boss-Extrude3 (add)
    with BuildSketch(Plane(origin=(0, 0, 6), x_dir=(-1, 0, 0), z_dir=(0, 0, -1))):
        Circle(SKETCH9_R)
        Circle(SKETCH9_R_2, mode=Mode.SUBTRACT)
    extrude(amount=-BOSS_EXTRUDE3_DEPTH)


solid = part.part
